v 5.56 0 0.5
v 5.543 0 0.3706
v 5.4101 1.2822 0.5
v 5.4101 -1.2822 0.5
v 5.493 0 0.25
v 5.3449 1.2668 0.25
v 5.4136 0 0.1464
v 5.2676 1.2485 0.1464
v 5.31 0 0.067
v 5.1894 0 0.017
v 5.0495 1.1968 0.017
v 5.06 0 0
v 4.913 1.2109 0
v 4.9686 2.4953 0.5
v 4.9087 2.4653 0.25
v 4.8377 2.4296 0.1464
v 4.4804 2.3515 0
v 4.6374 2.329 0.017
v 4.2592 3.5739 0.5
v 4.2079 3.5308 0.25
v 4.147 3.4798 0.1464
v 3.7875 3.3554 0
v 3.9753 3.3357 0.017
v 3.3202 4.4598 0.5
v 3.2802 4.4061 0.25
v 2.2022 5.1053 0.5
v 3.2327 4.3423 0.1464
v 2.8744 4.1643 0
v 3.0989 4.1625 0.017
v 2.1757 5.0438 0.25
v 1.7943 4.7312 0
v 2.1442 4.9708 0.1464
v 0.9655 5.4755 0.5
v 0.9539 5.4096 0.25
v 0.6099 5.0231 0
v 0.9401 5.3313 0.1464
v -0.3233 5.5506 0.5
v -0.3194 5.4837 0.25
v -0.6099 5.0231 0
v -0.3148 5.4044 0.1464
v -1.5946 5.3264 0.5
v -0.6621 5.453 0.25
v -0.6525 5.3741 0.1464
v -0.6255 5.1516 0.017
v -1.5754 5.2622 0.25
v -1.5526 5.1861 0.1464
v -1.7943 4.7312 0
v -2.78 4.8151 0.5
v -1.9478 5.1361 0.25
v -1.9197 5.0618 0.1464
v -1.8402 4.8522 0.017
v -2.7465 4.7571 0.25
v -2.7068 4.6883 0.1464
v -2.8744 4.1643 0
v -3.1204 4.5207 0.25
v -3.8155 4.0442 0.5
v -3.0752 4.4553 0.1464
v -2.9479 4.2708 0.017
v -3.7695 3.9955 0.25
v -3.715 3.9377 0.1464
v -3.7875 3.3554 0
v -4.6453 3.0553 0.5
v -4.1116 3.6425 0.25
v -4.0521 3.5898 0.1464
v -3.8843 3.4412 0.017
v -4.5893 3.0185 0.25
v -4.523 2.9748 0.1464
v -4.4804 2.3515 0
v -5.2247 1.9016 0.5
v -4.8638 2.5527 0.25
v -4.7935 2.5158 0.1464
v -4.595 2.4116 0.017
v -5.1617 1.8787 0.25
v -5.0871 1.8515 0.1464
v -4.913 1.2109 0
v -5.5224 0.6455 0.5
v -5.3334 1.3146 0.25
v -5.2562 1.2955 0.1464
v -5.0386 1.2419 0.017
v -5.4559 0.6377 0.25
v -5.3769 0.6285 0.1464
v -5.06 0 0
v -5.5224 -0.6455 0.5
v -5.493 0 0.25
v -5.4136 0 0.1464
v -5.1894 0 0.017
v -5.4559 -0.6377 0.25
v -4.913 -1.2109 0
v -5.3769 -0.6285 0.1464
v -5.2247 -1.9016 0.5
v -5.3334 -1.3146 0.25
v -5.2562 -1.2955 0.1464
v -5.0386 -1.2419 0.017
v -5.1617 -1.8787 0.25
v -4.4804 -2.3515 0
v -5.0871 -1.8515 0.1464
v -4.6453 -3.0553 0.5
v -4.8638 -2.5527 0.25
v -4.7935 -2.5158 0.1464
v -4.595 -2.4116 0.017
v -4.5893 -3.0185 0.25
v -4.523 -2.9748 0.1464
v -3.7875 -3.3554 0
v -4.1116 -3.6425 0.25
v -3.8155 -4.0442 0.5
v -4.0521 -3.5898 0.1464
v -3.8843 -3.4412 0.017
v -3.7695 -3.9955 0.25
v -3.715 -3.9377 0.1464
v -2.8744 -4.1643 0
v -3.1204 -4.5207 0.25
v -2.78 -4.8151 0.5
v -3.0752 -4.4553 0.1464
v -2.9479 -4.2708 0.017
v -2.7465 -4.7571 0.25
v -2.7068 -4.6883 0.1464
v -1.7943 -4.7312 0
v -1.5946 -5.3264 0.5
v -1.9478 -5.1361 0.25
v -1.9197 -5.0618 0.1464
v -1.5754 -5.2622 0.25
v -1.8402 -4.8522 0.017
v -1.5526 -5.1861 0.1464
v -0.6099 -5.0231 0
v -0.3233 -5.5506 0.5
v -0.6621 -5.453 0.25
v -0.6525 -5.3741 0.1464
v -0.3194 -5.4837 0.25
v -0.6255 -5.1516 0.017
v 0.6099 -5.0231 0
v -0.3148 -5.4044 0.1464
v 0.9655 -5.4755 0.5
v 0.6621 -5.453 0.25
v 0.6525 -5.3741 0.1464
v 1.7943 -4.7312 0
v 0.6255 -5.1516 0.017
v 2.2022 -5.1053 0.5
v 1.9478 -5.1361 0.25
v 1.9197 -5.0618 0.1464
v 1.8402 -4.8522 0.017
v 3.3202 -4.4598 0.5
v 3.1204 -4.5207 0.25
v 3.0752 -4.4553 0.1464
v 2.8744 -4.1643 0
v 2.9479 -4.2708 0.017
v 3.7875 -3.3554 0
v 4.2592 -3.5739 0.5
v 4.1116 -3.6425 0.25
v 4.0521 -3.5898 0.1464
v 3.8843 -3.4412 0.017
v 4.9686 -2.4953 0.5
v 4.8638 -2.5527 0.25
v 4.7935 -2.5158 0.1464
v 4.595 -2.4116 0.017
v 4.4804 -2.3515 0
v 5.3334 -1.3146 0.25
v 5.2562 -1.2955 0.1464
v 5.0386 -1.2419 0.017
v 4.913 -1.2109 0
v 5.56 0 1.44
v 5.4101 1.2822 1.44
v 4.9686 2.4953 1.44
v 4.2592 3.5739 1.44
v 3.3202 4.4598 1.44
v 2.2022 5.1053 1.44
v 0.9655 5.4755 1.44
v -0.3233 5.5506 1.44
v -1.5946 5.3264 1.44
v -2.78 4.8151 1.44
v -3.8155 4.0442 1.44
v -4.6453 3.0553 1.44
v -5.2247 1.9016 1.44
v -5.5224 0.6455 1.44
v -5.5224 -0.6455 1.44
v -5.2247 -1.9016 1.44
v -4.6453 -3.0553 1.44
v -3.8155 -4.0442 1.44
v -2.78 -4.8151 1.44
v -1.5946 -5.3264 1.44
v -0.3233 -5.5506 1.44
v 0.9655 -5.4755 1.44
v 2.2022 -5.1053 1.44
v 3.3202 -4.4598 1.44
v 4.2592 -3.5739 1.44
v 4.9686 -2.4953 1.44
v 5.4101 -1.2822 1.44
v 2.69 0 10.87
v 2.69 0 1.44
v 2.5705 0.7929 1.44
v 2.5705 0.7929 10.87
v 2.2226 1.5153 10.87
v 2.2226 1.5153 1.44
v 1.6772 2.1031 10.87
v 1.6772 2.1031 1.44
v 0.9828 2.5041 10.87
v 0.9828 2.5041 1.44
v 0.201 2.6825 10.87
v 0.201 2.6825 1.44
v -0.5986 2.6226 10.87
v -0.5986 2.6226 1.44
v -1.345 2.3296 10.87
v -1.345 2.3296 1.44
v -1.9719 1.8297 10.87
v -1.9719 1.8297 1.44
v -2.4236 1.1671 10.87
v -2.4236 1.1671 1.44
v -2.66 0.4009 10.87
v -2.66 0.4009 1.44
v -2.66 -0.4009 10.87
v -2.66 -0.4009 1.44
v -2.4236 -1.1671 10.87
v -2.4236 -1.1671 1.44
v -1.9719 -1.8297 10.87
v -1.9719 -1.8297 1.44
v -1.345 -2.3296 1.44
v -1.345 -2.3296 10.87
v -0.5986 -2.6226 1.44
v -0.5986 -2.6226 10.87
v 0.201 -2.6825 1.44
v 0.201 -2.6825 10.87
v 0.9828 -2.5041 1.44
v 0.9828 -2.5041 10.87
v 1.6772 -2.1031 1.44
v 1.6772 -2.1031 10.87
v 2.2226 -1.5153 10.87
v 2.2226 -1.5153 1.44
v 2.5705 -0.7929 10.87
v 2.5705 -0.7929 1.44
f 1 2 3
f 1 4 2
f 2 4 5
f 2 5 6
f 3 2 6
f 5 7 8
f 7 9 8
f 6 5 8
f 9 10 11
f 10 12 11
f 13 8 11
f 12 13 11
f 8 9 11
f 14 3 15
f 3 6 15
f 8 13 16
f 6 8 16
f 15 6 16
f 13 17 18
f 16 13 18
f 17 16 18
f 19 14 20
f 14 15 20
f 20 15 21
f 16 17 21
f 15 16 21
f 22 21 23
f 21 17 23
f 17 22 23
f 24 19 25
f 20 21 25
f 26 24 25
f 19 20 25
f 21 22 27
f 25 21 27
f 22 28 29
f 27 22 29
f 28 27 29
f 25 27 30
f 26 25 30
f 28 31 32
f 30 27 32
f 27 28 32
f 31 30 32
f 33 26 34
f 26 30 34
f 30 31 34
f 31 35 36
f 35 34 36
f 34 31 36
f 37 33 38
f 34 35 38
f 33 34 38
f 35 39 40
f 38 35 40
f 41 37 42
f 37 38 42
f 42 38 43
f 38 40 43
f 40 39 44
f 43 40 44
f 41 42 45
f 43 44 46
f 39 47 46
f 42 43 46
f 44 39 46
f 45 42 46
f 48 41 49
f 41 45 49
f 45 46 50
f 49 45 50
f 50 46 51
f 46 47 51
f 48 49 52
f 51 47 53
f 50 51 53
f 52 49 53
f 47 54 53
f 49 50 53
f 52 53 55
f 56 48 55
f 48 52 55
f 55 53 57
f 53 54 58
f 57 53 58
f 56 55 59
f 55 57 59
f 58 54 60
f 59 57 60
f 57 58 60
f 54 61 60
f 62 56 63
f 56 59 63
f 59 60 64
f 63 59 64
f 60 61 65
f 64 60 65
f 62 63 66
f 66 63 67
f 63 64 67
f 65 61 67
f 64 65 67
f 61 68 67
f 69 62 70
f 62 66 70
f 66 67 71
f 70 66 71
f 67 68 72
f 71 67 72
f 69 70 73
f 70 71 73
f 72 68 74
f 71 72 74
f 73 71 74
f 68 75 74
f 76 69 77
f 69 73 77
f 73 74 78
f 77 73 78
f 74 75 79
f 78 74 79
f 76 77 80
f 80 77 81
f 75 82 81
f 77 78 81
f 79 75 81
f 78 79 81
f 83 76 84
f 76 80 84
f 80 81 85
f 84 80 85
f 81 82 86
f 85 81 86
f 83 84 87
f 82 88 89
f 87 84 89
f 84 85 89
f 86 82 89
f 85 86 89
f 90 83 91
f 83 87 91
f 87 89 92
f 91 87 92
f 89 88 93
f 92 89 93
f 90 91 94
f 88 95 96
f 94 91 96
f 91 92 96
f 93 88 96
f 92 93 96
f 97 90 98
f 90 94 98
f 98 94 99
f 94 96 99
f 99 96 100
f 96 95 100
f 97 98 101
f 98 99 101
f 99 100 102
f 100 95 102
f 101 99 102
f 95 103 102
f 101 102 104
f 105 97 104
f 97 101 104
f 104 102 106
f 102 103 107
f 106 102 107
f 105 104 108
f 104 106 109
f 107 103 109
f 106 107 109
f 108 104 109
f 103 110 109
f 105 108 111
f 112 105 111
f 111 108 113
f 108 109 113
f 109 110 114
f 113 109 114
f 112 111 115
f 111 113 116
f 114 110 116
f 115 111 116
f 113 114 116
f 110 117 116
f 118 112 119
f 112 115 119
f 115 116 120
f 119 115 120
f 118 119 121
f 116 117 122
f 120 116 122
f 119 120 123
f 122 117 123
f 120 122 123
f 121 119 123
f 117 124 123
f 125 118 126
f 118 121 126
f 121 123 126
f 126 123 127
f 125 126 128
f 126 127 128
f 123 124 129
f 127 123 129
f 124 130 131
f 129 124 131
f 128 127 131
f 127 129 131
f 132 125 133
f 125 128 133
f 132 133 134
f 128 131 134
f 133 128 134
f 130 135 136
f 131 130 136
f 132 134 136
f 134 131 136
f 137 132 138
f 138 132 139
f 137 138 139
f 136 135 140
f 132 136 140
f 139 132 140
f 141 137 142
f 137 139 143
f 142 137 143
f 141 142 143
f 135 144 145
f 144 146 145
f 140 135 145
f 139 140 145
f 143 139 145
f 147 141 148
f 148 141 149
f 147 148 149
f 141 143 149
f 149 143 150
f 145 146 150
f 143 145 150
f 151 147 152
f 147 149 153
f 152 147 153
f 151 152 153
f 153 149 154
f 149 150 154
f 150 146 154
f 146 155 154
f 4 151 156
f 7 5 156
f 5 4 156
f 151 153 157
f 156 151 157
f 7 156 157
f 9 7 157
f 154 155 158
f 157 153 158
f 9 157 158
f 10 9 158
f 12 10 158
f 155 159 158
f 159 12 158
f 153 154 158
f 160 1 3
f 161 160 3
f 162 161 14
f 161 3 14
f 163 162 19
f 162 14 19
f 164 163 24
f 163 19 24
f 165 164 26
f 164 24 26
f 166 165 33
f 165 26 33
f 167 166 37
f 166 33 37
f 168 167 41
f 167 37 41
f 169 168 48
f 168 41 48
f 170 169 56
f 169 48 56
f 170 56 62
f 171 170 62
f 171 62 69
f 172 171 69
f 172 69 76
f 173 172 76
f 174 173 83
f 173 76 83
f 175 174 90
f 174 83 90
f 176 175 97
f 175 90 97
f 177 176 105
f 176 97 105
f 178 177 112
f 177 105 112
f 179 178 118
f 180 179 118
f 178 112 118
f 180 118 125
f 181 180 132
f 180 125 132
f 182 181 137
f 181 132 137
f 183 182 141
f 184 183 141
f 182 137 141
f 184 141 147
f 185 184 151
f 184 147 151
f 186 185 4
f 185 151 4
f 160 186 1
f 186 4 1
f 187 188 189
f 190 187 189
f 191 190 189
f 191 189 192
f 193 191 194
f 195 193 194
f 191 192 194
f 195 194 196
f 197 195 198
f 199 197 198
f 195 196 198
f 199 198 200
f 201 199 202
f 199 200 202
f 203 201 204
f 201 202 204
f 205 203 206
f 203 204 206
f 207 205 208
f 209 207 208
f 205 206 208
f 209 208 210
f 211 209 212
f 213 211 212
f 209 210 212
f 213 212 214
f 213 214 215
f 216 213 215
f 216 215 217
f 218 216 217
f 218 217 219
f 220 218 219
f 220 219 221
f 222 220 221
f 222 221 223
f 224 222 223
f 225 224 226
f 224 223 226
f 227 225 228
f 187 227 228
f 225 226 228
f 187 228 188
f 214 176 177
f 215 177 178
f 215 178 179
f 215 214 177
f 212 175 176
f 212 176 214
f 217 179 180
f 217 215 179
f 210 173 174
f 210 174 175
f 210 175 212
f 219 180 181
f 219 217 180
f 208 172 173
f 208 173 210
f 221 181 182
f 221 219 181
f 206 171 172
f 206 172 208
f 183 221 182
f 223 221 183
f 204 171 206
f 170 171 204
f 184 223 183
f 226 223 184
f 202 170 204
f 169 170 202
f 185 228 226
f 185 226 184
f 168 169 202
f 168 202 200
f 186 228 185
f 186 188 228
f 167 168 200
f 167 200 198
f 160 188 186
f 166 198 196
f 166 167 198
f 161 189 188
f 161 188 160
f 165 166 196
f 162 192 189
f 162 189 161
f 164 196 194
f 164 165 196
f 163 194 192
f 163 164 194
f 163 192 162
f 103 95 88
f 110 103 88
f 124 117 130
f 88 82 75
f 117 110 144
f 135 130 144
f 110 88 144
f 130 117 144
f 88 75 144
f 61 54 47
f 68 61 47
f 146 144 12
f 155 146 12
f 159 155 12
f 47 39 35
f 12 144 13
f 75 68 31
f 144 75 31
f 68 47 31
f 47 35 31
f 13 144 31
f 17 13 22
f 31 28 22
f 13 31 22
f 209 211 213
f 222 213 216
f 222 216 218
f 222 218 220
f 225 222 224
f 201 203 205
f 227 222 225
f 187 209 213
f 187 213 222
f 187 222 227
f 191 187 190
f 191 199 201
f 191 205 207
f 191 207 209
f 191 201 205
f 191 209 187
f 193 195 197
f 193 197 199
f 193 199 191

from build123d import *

# Parameters (mm, degrees)
SKETCH1_R           = 5.56
BOSS_EXTRUDE1_DEPTH = 1.44
SKETCH2_R           = 2.69
BOSS_EXTRUDE2_DEPTH = 9.43
FILLET1_R           = 0.5


with BuildPart() as part:
    # Sketch1 → Boss-Extrude1 (new body)
    with BuildSketch(Plane.XY):
        Circle(SKETCH1_R)
    extrude(amount=BOSS_EXTRUDE1_DEPTH)

    # Sketch2 → Boss-Extrude2 (add)
    with BuildSketch(Plane.XY.offset(1.44)):
        Circle(SKETCH2_R)
    extrude(amount=BOSS_EXTRUDE2_DEPTH)

    # Fillet1
    fillet1_edges = [part.edges().sort_by_distance(p)[0] for p in [
        (-5.56, 0, 0),
    ]]
    fillet(fillet1_edges, radius=FILLET1_R)


solid = part.part
